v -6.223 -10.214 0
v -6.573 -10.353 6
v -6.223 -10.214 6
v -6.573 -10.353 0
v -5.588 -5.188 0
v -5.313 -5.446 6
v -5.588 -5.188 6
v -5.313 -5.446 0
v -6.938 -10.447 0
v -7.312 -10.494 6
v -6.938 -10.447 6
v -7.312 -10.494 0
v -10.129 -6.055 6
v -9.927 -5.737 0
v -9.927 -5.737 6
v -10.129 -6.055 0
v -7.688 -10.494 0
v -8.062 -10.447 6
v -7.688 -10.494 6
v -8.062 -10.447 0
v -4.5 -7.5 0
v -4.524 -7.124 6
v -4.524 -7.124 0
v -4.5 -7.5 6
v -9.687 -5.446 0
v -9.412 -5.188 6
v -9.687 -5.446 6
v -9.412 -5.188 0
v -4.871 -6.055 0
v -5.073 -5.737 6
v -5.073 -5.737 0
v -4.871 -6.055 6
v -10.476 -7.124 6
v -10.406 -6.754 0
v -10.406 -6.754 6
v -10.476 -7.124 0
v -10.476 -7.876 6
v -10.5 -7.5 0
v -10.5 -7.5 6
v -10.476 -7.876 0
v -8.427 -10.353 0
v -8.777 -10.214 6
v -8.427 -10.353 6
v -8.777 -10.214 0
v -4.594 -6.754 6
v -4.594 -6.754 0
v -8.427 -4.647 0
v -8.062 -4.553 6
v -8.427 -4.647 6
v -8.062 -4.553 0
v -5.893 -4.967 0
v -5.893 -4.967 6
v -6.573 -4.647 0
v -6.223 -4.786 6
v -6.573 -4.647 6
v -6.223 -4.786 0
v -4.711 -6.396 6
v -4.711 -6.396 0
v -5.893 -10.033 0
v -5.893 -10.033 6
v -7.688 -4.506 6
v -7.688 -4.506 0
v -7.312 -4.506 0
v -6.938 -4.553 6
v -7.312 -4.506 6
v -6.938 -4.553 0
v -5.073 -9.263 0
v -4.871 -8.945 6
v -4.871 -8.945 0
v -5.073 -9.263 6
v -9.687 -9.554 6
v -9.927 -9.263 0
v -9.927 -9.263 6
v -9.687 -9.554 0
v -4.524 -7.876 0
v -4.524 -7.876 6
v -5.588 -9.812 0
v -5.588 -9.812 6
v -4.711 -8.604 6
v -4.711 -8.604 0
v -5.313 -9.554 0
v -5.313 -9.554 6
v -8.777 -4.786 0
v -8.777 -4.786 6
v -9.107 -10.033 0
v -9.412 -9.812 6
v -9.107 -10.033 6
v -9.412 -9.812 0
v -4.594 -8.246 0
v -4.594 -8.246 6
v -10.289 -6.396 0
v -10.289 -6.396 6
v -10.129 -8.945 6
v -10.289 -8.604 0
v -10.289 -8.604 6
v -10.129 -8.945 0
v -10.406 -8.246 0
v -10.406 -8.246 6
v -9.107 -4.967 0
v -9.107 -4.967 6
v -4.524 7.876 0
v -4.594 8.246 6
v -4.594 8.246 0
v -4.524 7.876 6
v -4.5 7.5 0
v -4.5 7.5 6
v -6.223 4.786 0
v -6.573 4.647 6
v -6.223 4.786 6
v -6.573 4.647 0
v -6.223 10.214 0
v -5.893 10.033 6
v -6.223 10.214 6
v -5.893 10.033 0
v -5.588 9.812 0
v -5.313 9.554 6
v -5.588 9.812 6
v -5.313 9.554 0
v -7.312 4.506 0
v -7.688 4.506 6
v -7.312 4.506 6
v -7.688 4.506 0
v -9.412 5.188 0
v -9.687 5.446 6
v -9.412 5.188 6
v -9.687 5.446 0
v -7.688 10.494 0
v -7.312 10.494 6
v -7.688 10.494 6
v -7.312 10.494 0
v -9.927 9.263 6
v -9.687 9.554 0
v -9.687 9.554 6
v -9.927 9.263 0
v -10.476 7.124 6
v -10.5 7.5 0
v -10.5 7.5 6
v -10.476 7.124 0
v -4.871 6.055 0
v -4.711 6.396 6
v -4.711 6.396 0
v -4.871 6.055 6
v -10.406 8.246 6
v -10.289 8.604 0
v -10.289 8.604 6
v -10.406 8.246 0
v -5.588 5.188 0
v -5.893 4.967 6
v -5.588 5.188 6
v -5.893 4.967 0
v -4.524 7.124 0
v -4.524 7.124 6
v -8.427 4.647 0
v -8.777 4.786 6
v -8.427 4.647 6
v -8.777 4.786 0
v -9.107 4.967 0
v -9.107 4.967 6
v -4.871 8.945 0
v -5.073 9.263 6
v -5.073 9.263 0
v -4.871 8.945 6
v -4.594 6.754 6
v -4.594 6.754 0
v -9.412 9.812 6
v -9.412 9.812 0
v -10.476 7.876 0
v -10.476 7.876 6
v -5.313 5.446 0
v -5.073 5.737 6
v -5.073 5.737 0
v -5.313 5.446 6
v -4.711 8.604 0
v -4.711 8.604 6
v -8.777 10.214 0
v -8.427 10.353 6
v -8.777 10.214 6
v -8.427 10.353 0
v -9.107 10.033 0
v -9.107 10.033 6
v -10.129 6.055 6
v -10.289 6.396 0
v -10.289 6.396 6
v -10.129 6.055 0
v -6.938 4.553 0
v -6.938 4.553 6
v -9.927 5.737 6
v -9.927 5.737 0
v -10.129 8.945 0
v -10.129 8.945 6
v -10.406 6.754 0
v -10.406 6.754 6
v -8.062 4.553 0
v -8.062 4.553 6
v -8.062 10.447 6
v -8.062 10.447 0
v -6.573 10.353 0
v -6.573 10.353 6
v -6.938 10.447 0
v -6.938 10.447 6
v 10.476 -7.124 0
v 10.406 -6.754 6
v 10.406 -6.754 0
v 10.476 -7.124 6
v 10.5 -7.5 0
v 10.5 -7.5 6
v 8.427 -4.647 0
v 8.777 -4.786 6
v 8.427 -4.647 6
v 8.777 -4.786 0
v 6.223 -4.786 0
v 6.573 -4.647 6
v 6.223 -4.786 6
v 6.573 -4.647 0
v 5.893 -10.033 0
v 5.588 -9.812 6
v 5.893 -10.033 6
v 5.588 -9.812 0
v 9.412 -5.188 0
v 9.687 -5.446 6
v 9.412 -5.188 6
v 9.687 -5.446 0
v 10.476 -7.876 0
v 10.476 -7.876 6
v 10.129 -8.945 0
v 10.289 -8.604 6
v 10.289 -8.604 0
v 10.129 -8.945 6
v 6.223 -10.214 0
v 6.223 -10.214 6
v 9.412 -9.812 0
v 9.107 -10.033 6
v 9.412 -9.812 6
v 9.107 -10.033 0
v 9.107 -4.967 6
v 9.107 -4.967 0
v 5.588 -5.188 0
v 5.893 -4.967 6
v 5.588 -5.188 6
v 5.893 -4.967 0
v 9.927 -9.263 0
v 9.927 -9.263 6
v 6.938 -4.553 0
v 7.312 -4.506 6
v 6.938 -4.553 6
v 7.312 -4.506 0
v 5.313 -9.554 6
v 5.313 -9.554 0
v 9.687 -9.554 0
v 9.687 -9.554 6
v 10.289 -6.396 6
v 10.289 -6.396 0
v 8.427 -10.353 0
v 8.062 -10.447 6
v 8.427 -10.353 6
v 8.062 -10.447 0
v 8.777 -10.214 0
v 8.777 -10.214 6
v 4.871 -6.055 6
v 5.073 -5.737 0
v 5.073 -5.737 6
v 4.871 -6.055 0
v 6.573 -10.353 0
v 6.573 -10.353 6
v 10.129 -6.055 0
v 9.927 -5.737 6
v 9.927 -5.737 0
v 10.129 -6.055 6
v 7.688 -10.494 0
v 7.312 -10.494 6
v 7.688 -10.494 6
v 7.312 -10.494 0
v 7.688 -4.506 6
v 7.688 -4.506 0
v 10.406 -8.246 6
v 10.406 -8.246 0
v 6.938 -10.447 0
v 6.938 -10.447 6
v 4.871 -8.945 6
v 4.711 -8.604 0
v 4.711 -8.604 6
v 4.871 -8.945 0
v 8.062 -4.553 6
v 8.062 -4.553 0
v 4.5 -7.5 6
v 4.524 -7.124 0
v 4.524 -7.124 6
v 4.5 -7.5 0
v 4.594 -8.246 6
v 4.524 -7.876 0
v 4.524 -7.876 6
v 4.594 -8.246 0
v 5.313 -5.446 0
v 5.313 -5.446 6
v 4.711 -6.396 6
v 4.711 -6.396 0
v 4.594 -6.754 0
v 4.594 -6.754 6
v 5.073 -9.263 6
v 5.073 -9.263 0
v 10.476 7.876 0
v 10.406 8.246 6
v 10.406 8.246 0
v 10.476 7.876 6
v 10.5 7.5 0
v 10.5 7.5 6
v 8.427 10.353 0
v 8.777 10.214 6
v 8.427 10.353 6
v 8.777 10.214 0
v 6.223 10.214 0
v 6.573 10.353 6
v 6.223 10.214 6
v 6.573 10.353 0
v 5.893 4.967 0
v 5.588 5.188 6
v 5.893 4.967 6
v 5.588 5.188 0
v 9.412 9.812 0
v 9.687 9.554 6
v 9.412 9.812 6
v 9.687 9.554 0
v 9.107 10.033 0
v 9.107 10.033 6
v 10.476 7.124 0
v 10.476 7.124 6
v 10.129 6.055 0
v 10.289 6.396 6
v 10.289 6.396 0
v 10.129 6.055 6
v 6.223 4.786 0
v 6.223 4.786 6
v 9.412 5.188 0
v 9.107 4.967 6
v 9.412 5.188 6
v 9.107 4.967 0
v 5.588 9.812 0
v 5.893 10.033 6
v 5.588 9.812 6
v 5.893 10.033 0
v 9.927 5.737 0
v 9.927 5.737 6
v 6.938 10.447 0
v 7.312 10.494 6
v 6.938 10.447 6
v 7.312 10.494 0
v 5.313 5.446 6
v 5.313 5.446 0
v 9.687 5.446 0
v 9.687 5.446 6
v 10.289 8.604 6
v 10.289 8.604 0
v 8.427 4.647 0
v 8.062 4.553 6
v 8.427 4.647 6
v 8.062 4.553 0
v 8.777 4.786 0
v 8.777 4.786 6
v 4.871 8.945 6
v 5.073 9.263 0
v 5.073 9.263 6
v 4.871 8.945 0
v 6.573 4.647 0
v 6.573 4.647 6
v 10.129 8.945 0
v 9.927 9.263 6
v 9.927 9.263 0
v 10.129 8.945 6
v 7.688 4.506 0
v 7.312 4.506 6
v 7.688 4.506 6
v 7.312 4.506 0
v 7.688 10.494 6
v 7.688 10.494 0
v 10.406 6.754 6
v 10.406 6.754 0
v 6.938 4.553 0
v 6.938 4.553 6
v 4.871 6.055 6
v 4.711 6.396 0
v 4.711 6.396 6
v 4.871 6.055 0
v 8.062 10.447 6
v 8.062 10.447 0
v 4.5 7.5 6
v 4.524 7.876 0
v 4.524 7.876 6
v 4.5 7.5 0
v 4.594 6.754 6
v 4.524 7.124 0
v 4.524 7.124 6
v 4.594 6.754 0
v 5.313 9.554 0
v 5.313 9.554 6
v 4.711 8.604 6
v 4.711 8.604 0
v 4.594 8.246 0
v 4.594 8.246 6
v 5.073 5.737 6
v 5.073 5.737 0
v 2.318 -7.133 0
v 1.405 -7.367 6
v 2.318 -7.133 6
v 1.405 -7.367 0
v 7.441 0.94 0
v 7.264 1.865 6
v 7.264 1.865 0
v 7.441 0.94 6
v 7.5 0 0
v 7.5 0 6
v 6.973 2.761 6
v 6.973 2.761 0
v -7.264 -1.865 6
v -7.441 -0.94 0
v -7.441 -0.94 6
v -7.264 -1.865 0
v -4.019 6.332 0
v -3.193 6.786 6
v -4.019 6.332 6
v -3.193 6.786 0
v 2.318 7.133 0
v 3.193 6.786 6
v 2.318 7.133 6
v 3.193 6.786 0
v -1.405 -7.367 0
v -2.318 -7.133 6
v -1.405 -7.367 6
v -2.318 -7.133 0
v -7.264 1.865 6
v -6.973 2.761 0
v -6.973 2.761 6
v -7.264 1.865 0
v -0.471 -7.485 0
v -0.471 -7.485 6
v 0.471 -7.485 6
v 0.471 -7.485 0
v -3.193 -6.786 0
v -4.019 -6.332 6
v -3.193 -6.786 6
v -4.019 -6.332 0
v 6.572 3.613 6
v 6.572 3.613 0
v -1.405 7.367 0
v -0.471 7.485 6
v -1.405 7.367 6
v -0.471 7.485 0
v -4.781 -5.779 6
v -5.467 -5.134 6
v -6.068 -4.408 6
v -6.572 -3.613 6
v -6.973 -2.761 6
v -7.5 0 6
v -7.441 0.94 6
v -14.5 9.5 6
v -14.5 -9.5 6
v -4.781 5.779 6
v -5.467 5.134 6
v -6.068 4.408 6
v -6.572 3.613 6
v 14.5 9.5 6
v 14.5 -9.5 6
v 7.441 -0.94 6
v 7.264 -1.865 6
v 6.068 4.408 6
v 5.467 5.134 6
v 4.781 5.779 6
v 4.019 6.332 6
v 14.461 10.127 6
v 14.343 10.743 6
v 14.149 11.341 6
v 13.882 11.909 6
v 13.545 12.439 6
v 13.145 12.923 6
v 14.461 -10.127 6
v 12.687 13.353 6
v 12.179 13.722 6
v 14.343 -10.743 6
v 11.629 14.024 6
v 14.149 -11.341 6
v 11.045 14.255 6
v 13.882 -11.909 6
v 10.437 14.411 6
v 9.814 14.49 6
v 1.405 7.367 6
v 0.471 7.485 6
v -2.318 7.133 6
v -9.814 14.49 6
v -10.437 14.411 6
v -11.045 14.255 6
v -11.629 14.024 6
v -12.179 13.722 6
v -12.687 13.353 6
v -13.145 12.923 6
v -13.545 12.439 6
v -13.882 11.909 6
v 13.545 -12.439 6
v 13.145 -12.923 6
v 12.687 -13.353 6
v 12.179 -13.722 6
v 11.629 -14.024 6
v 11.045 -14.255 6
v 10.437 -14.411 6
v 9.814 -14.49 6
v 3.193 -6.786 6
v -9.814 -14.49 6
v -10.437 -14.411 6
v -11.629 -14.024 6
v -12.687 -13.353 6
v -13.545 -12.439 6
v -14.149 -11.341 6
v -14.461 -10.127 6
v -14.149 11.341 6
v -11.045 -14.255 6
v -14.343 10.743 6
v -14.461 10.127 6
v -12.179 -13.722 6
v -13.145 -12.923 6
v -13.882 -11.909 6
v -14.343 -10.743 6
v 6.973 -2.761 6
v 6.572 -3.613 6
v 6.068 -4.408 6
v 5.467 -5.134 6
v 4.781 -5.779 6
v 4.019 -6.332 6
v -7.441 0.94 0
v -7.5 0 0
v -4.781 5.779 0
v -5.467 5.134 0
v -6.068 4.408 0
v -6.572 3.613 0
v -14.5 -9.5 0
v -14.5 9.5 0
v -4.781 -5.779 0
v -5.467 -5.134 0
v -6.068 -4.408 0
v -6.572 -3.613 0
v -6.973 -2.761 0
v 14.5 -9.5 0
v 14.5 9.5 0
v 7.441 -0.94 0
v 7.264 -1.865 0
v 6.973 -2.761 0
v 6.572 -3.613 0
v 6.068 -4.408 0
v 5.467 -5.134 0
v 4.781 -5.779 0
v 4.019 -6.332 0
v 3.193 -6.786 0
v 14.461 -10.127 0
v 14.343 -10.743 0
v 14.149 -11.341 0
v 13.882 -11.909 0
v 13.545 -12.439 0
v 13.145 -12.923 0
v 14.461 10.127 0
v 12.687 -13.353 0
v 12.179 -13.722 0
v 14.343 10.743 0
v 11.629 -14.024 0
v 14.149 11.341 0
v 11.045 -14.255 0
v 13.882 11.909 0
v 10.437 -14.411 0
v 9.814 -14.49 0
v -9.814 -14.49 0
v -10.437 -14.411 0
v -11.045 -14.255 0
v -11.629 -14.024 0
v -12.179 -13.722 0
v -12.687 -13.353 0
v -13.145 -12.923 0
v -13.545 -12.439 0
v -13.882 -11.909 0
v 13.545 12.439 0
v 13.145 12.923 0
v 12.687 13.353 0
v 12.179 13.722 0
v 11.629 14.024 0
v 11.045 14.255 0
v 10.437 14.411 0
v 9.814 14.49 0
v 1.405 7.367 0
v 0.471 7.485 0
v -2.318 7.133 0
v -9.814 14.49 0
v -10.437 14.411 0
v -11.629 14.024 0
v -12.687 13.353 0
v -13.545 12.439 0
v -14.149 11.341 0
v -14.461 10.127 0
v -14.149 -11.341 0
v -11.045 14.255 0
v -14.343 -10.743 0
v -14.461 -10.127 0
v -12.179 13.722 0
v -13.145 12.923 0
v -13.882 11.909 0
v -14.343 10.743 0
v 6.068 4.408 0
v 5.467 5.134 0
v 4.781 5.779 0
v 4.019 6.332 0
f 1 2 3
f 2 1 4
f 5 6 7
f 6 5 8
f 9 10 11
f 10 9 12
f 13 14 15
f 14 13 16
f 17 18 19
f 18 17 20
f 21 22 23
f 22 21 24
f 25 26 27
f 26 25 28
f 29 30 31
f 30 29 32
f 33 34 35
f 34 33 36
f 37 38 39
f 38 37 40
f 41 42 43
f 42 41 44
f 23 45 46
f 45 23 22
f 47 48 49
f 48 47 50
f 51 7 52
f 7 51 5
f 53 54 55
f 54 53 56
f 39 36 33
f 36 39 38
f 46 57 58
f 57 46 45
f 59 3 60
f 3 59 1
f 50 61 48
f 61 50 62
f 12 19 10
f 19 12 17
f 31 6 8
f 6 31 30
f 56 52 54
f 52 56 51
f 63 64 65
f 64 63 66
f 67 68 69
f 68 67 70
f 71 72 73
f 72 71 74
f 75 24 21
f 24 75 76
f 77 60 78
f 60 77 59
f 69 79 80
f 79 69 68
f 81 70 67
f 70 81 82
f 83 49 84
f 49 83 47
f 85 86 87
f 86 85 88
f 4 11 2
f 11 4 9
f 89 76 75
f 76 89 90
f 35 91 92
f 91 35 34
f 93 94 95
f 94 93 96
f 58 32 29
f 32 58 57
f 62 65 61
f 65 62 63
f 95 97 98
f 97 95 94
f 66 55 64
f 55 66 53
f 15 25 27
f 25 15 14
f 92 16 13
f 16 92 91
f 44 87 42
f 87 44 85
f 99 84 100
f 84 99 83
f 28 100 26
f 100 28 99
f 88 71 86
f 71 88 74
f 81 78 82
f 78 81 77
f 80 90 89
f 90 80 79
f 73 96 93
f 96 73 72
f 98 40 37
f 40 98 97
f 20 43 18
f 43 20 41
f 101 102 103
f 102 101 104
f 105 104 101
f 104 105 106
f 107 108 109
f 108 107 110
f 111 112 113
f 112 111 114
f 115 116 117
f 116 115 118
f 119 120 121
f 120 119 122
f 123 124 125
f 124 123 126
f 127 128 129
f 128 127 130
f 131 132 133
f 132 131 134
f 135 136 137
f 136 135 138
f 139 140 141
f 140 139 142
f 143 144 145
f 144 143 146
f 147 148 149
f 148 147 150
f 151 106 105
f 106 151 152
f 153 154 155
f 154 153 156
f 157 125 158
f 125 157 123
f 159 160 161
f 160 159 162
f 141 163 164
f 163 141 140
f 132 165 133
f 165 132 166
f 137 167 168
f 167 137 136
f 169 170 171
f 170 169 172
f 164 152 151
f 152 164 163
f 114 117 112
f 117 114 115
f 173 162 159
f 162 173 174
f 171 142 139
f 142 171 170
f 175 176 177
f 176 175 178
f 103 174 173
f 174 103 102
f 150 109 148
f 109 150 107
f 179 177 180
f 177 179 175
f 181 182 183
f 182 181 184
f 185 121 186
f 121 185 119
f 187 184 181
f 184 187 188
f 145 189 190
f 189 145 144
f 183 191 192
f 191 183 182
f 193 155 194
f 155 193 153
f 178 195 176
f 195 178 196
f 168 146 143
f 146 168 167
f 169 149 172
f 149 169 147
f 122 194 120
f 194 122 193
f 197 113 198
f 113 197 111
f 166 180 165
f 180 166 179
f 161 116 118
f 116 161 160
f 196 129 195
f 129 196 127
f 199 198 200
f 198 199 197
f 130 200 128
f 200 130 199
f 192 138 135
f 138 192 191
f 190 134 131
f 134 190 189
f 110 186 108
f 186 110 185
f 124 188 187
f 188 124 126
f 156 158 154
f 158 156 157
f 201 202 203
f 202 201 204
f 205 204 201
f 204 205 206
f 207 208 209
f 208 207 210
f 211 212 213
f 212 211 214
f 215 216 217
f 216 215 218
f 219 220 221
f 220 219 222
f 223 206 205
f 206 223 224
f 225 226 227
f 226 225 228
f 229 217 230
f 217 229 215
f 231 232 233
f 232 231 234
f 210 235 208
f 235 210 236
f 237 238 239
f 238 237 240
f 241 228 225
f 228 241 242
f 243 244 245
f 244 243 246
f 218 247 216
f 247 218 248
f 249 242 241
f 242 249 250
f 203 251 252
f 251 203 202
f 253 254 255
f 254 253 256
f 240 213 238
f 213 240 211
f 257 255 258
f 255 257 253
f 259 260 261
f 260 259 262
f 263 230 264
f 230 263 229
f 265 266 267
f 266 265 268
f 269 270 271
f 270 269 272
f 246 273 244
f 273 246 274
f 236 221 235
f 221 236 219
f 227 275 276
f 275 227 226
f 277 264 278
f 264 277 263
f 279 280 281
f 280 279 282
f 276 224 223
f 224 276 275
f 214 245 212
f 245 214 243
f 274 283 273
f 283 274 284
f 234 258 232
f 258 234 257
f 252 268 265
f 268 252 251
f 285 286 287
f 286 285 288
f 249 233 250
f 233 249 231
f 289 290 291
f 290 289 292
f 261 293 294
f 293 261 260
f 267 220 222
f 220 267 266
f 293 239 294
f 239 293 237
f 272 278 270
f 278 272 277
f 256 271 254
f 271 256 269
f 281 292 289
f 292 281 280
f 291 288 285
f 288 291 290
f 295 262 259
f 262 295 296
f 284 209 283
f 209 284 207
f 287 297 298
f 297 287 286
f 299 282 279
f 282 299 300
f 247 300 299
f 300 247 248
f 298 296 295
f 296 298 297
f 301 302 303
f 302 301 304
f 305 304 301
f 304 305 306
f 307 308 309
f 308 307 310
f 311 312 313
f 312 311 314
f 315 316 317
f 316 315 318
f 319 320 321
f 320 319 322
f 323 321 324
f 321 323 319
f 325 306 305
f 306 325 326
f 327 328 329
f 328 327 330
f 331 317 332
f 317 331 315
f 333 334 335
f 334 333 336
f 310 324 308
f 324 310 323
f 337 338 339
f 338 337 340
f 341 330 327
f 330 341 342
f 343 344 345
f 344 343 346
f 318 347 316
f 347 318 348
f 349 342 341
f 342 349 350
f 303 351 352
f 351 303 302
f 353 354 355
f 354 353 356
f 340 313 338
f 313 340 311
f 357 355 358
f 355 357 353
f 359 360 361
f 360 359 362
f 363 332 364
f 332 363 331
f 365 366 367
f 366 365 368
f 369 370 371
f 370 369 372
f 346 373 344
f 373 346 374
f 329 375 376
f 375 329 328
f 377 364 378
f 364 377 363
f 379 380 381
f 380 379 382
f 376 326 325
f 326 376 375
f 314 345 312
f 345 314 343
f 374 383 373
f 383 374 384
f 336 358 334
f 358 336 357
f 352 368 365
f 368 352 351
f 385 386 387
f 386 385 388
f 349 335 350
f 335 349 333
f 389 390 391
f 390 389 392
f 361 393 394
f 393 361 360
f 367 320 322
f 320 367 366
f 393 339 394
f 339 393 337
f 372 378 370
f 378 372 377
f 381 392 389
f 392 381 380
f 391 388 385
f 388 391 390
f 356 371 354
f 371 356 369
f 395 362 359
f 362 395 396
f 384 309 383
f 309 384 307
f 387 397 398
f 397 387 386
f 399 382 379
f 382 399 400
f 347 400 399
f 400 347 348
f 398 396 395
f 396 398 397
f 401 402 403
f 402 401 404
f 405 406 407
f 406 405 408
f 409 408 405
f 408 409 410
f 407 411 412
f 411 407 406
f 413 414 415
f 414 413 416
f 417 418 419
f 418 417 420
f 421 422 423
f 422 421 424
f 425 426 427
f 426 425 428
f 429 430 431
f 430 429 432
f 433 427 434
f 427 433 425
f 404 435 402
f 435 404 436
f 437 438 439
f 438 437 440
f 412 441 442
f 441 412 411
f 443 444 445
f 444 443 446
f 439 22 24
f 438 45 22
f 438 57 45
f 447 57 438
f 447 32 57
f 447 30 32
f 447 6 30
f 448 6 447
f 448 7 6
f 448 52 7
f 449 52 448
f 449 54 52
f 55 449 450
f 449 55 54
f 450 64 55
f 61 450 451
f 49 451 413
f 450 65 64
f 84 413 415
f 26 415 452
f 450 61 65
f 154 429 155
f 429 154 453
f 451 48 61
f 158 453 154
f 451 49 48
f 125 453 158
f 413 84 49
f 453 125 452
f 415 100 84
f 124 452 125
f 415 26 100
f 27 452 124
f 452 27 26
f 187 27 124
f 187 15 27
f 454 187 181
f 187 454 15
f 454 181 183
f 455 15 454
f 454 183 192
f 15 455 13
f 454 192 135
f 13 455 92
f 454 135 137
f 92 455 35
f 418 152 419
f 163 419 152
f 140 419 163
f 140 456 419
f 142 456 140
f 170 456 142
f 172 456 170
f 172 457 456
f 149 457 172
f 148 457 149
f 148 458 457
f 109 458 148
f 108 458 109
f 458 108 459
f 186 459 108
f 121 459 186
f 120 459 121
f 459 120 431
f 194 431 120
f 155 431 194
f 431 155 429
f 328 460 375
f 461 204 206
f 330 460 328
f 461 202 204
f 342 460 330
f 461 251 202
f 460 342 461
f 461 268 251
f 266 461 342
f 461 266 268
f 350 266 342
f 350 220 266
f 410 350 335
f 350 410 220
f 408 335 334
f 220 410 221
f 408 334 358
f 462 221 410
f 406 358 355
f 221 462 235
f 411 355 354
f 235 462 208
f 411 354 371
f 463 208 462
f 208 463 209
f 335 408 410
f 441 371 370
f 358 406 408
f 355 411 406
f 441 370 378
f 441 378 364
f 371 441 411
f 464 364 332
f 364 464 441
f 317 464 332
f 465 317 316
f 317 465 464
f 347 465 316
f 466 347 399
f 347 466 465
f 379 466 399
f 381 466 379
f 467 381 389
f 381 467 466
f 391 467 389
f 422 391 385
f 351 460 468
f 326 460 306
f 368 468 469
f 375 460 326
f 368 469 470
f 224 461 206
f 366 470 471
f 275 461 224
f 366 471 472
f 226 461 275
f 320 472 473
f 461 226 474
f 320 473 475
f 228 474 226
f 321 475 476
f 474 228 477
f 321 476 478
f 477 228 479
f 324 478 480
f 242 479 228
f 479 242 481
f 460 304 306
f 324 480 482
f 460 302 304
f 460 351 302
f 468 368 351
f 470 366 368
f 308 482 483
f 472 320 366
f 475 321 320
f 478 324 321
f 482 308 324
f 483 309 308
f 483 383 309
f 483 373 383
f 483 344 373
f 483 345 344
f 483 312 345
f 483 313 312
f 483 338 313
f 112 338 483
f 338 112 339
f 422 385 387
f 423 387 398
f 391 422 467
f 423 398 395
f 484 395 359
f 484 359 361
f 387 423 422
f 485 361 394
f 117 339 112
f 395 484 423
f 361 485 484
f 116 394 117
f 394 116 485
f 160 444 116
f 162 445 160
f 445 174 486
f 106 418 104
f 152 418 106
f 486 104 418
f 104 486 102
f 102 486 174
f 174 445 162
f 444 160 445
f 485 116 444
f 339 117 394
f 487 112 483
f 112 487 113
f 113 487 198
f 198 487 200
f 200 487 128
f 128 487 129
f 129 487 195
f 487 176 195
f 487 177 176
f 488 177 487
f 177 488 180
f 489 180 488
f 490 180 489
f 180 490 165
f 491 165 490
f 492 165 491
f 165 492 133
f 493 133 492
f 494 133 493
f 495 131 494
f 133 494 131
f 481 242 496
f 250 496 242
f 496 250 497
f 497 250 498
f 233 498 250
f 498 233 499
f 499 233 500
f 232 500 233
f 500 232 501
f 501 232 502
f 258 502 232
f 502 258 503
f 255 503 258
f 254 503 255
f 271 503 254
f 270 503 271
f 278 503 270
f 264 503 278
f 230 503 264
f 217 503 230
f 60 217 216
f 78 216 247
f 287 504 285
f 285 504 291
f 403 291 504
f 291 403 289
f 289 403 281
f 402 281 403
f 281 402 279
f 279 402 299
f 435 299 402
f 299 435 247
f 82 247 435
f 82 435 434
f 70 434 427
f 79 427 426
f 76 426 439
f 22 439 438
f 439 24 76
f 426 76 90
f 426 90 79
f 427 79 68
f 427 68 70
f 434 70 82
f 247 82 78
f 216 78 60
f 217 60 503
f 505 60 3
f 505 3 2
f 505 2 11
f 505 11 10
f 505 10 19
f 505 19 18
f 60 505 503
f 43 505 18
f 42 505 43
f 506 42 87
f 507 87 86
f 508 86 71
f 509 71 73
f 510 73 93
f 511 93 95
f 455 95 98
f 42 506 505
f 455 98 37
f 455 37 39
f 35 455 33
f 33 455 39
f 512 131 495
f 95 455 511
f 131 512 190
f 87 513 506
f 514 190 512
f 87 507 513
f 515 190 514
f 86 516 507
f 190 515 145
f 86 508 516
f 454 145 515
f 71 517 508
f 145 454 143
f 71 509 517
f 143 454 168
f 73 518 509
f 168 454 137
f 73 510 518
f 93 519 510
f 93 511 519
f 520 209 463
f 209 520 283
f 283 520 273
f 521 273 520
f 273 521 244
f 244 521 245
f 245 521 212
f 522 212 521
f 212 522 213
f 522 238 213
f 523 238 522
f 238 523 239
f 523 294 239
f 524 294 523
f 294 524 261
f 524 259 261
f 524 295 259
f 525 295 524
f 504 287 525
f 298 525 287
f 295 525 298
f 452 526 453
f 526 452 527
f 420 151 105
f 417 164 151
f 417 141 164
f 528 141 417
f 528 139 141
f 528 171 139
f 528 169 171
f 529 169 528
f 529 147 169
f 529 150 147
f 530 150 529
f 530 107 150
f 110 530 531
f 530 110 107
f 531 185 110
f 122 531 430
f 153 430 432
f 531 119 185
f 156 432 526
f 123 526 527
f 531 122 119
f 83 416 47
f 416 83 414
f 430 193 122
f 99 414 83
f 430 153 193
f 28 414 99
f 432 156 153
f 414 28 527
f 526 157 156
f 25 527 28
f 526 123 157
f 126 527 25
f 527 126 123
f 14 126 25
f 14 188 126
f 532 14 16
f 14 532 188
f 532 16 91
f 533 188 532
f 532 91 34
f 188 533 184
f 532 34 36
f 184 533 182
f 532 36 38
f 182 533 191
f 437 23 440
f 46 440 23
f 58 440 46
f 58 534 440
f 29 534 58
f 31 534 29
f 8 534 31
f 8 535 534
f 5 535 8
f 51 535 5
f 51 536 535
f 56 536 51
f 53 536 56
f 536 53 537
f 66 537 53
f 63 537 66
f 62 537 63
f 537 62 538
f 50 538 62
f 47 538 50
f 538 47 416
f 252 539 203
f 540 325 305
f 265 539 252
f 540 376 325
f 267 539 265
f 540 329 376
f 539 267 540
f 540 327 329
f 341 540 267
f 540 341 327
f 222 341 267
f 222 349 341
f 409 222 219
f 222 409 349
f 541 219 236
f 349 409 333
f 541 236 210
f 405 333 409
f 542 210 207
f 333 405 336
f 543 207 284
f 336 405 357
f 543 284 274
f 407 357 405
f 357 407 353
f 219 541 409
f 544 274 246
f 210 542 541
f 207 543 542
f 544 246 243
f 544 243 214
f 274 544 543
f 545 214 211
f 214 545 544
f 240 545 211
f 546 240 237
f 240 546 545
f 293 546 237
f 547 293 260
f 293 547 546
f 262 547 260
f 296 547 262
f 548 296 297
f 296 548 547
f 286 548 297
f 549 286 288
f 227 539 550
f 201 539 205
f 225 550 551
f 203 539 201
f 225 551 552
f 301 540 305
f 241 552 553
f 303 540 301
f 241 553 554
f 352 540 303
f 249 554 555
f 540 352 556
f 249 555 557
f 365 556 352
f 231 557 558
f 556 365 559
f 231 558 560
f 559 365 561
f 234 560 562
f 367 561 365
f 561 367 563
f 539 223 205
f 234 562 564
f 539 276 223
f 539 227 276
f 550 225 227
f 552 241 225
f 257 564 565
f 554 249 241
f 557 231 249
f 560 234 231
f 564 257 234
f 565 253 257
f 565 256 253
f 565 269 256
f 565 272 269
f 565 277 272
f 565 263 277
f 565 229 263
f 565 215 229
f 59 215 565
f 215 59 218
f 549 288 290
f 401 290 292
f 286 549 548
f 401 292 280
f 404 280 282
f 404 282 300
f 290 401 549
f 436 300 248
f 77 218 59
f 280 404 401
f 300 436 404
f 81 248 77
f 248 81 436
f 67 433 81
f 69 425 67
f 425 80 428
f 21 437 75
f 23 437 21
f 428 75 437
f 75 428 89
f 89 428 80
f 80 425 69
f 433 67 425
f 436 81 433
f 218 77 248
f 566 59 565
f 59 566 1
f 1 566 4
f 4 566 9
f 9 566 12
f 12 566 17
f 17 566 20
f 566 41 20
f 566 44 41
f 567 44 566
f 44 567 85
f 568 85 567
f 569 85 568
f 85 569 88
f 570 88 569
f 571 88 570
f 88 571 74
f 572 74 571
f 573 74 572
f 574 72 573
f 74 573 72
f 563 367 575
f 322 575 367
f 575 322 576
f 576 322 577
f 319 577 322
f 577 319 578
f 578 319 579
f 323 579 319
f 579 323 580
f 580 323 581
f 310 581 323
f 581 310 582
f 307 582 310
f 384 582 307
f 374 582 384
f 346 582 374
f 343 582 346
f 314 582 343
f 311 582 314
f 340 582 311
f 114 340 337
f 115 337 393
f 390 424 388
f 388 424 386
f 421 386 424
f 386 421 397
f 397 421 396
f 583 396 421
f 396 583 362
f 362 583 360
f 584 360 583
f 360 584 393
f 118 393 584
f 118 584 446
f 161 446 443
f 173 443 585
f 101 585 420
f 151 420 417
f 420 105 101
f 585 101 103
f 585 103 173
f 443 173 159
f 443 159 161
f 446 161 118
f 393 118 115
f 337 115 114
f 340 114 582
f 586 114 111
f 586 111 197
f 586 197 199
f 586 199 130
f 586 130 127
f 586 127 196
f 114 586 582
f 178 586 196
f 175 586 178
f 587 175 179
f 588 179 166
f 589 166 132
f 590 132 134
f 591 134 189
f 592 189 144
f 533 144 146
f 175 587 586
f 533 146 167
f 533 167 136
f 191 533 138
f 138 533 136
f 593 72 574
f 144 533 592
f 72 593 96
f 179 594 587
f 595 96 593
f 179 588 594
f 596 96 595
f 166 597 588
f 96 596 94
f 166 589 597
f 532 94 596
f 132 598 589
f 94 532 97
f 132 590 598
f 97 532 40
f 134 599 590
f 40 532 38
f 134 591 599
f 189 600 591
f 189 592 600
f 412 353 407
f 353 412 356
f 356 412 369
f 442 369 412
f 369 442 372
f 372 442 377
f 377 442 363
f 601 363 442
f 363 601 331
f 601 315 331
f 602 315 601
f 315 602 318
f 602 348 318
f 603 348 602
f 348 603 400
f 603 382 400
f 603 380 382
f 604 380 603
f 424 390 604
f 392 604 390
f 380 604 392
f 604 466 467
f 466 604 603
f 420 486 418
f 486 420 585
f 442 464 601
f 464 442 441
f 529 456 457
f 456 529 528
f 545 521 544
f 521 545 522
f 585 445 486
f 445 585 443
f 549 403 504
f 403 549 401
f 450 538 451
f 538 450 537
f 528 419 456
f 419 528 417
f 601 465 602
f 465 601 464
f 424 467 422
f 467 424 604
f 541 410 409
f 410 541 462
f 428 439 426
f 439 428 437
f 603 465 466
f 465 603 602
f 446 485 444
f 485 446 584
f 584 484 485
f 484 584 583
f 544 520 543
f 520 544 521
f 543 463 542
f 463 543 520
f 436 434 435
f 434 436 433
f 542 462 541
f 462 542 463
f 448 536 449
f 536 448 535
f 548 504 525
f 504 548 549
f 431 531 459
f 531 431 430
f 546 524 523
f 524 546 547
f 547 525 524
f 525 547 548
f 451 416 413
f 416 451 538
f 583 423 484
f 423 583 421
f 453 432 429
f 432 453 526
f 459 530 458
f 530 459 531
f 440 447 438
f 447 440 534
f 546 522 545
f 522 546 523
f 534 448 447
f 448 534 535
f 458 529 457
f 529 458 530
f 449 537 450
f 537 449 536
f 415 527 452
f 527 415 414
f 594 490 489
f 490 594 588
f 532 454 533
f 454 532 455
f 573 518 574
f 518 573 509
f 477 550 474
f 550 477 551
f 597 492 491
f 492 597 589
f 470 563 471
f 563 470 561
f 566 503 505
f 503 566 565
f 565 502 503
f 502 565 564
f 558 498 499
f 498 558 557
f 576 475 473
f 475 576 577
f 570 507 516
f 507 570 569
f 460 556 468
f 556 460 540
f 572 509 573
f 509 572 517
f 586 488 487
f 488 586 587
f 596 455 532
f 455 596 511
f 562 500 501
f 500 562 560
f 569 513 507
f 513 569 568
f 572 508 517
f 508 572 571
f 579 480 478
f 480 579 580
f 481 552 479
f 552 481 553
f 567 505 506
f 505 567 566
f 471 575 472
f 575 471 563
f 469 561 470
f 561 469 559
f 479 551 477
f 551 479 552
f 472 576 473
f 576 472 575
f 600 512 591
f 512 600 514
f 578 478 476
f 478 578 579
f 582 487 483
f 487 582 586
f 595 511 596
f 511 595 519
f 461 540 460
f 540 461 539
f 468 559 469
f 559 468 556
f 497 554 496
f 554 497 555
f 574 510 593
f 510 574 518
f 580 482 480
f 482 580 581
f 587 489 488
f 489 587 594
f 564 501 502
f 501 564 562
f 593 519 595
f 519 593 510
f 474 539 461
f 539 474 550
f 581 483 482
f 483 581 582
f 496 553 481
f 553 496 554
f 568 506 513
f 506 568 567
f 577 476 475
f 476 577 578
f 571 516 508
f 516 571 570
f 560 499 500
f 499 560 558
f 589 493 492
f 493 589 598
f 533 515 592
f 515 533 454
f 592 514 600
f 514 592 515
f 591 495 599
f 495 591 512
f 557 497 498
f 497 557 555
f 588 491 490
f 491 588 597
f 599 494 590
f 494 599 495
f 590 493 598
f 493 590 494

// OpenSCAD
$fn = 50;


difference() {
	union() {
		hull() {
			translate(v = [-9.5000000000, 9.5000000000, 0]) {
				cylinder(h = 6, r = 5);
			}
			translate(v = [9.5000000000, 9.5000000000, 0]) {
				cylinder(h = 6, r = 5);
			}
			translate(v = [-9.5000000000, -9.5000000000, 0]) {
				cylinder(h = 6, r = 5);
			}
			translate(v = [9.5000000000, -9.5000000000, 0]) {
				cylinder(h = 6, r = 5);
			}
		}
	}
	union() {
		#translate(v = [-7.5000000000, -7.5000000000, -100.0000000000]) {
			cylinder(h = 200, r = 3.0000000000);
		}
		#translate(v = [-7.5000000000, 7.5000000000, -100.0000000000]) {
			cylinder(h = 200, r = 3.0000000000);
		}
		#translate(v = [7.5000000000, -7.5000000000, -100.0000000000]) {
			cylinder(h = 200, r = 3.0000000000);
		}
		#translate(v = [7.5000000000, 7.5000000000, -100.0000000000]) {
			cylinder(h = 200, r = 3.0000000000);
		}
		#cylinder(h = 6, r = 7.5000000000);
	}
}
